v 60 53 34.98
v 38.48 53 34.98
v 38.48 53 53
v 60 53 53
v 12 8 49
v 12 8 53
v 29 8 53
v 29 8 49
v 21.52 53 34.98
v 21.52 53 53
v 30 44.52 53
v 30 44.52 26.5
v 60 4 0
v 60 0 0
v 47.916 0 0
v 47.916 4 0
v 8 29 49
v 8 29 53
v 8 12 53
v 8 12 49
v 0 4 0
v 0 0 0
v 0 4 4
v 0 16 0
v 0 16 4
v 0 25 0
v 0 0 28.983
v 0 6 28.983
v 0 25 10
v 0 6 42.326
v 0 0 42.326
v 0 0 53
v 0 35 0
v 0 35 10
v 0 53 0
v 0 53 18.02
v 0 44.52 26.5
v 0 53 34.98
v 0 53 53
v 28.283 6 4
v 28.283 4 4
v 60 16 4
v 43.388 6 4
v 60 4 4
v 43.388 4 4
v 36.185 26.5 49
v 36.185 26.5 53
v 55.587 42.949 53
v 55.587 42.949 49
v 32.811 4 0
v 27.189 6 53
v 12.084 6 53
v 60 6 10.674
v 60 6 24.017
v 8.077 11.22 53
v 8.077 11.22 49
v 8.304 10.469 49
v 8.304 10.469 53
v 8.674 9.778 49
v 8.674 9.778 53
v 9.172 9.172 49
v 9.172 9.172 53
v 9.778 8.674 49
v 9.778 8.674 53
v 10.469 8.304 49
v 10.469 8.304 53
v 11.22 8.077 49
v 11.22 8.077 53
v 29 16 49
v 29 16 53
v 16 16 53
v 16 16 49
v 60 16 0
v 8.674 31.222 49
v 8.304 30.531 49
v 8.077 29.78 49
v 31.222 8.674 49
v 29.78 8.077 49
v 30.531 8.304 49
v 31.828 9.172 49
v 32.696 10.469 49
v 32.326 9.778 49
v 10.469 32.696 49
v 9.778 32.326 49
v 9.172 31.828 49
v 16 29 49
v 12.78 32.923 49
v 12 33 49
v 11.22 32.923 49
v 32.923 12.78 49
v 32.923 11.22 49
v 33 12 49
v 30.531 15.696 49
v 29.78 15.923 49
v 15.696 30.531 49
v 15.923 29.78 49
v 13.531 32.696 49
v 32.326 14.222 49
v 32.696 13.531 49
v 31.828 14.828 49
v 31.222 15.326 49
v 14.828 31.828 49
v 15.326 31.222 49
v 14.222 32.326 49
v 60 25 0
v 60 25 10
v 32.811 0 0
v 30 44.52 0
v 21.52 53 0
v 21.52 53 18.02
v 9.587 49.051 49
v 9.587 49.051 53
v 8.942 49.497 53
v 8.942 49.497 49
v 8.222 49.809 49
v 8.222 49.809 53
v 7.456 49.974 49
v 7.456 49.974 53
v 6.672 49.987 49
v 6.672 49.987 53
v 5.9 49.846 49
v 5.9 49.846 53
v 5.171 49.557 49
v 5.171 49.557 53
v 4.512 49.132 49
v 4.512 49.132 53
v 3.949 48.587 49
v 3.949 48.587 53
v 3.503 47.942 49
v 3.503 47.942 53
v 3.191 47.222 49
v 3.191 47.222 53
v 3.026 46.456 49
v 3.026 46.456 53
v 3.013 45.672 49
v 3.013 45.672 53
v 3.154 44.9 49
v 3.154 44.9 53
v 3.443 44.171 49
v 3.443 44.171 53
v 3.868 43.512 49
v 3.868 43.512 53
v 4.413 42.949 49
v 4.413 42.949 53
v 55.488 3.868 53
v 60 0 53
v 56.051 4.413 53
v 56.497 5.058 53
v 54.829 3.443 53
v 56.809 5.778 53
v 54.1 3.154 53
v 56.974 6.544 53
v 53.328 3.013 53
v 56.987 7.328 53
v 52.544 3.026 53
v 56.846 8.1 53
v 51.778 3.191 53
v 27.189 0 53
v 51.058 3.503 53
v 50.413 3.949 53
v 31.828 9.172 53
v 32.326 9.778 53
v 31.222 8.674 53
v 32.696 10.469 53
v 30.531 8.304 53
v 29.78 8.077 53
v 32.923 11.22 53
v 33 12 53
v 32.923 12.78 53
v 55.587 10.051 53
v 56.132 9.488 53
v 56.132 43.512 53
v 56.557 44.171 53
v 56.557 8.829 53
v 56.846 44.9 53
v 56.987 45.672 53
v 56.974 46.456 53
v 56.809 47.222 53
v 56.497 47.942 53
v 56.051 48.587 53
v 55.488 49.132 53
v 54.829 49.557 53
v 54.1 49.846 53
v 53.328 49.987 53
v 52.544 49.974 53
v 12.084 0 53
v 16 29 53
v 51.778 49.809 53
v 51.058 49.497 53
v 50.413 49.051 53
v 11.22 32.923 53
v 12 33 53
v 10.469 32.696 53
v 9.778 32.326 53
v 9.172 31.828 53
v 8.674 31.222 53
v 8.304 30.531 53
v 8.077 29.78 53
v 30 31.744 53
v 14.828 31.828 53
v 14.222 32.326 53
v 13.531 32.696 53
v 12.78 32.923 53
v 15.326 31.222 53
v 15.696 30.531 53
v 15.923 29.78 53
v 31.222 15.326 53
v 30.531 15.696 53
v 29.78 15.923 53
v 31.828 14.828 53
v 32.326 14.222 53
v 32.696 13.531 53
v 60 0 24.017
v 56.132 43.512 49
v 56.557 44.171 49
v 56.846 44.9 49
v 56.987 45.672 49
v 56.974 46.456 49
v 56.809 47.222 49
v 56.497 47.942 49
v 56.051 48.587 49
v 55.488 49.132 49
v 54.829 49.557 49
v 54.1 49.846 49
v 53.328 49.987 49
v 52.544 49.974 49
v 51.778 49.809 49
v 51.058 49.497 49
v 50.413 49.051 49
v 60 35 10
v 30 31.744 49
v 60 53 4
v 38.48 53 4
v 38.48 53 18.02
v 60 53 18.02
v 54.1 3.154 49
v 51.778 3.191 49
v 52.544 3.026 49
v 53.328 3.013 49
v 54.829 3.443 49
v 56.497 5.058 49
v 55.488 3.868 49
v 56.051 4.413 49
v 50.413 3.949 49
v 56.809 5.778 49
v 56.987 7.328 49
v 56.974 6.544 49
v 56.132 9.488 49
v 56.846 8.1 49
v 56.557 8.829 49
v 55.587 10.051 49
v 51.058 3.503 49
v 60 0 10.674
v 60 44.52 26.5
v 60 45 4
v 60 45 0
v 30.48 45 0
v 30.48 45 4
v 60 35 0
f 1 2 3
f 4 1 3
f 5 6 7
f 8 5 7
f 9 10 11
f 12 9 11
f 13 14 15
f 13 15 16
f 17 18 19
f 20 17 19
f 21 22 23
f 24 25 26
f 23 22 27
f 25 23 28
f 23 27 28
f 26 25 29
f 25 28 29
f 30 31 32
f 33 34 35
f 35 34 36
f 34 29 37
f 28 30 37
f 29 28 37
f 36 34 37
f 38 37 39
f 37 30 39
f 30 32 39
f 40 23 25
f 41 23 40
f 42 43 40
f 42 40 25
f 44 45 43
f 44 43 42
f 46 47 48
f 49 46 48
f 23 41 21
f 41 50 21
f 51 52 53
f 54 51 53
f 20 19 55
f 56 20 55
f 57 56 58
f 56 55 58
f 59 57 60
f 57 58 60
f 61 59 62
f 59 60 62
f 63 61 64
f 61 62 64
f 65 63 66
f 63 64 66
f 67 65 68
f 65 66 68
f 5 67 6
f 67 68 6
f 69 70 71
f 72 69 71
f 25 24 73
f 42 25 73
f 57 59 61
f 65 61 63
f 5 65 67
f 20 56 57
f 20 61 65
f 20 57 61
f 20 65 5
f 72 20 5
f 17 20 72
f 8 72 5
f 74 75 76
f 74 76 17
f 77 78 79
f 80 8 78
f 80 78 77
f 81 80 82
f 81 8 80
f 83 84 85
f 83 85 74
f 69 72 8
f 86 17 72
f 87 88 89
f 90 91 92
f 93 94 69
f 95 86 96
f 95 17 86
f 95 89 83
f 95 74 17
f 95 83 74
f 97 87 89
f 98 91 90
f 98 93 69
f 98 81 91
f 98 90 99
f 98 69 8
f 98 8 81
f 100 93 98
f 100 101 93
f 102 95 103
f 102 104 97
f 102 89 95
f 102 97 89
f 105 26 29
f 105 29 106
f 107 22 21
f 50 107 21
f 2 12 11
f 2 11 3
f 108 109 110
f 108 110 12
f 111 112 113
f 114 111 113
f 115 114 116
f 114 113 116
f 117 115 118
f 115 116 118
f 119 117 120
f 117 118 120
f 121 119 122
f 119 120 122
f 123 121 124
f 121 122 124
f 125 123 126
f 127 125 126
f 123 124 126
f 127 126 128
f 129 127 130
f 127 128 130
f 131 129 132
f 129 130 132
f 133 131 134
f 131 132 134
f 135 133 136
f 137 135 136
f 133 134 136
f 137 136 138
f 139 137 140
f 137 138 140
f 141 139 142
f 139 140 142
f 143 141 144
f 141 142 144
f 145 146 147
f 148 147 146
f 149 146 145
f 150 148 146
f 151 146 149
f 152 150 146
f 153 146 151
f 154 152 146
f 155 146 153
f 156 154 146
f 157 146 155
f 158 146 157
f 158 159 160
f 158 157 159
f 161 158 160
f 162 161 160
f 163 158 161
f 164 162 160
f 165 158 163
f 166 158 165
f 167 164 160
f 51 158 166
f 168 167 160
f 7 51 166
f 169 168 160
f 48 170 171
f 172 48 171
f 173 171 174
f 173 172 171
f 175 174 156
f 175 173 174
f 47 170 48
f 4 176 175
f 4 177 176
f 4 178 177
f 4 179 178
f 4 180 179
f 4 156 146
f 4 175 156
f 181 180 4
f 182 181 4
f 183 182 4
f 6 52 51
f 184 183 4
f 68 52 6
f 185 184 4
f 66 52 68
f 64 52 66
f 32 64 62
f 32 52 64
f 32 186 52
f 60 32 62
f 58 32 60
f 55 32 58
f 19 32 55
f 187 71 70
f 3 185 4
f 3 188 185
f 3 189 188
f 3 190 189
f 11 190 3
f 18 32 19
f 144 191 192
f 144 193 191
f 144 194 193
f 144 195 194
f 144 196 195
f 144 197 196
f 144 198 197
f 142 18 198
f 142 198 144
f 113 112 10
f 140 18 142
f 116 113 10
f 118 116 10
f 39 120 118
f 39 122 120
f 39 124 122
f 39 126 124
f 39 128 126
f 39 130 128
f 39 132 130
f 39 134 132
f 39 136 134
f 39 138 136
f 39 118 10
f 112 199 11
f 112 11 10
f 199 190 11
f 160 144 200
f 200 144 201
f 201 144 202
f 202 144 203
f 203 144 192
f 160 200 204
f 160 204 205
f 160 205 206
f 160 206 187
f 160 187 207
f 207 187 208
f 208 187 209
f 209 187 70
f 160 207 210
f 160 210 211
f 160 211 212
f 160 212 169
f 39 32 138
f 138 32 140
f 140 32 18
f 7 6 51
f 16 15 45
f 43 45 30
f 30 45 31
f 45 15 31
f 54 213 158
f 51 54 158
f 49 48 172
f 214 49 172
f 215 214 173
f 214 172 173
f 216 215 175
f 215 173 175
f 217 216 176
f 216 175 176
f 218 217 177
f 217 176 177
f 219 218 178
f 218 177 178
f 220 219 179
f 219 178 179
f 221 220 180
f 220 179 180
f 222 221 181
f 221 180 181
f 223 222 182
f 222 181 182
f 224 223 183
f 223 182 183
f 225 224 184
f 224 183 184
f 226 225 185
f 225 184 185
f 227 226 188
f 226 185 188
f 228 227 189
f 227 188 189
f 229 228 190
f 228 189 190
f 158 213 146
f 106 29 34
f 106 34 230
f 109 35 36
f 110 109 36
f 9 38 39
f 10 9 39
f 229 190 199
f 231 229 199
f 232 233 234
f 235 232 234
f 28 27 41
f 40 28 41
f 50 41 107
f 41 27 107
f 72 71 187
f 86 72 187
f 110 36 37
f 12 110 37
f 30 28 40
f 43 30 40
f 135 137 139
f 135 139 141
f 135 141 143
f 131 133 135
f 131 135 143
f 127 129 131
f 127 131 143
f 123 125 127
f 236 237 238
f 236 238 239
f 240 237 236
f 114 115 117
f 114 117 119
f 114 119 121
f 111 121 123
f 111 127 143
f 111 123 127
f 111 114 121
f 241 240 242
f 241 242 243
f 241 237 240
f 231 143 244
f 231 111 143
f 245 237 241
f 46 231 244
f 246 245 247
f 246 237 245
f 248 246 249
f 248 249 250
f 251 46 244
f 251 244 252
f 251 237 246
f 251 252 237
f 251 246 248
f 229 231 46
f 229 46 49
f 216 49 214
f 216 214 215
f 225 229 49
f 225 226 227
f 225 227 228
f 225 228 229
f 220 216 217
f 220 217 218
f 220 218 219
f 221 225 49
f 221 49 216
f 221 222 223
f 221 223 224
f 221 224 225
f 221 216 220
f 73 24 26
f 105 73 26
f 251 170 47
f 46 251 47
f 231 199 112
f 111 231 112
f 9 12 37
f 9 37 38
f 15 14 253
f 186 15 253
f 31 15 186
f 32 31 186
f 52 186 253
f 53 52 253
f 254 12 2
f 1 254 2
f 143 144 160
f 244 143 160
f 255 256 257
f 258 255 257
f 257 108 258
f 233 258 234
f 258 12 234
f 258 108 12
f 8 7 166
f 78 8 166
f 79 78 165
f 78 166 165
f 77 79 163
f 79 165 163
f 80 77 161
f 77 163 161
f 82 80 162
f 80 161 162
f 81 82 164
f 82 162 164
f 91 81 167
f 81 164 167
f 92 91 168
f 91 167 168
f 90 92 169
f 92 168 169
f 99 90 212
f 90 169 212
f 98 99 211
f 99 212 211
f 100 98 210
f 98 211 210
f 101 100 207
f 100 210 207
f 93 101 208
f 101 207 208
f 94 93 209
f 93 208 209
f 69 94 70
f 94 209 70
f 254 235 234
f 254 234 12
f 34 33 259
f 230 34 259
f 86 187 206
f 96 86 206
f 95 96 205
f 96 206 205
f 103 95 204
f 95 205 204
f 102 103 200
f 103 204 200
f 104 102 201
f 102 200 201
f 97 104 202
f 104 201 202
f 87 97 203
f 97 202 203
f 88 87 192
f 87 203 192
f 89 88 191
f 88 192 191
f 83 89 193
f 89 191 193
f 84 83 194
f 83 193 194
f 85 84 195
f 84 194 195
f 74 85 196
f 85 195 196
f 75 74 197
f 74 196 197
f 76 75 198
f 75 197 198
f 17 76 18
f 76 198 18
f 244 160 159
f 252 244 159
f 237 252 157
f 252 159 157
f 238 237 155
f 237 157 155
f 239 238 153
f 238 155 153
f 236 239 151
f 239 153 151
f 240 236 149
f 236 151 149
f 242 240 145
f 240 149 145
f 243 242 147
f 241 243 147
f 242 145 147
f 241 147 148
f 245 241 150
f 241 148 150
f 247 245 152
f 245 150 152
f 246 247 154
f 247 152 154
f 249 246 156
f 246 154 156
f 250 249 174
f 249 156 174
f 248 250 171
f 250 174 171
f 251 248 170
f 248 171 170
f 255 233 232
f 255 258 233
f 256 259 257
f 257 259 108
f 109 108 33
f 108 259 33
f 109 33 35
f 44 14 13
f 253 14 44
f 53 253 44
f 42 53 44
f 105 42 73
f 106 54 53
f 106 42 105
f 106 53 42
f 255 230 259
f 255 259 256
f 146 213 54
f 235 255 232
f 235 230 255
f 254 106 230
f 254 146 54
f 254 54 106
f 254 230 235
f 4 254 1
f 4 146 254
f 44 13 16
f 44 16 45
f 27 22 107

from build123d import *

# Parameters (mm, degrees)
F0_W      = 53
F0_H      = 53
F1_DEPTH  = 60
F3_DEPTH  = 4
F4_DEPTH  = 53
F6_DEPTH  = 6
F8_DEPTH  = 60
F10_DEPTH = 4
F9_W      = 60
F9_H      = 10
F11_DEPTH = 10
F12_DEPTH = 25


with BuildPart() as f1:
    # F0 (on Right) → F1 (new body)
    with BuildSketch(Plane.YZ):
        with Locations((26.5, 26.5)):
            Rectangle(F0_W, F0_H)
    extrude(amount=F1_DEPTH)

    # F2 (on face) → F3 (cut)
    with BuildSketch(Plane.XY.offset(53)):
        with BuildLine():
            ThreePointArc((9.5867410065, 49.0510278539), (3.9489721461, 48.5867410065), (4.4132589935, 42.9489721461))
            Line((4.4132589935, 42.9489721461), (27.4132590282, 23.4489721167))
            ThreePointArc((27.4132590282, 23.4489721167), (26, 26.4999999772), (27.4132589935, 29.5510278539))
            Line((27.4132589935, 29.5510278539), (30, 31.7441343594))
            Line((30, 31.7441343594), (9.5867410065, 49.0510278539))
        make_face()
        with BuildLine():
            ThreePointArc((32.5867410065, 23.4489721461), (30.0000000228, 22.5), (27.4132590282, 23.4489721167))
            Line((27.4132590282, 23.4489721167), (50.4132589935, 3.9489721461))
            ThreePointArc((50.4132589935, 3.9489721461), (56.0510278539, 4.4132589935), (55.5867410065, 10.0510278539))
            Line((55.5867410065, 10.0510278539), (36.1853892444, 26.5))
            Line((36.1853892444, 26.5), (32.5867410065, 23.4489721461))
        make_face()
        with BuildLine():
            ThreePointArc((27.4132589935, 29.5510278539), (26, 26.4999999772), (27.4132590282, 23.4489721167))
            ThreePointArc((27.4132590282, 23.4489721167), (30.0000000228, 22.5), (32.5867410065, 23.4489721461))
            Line((32.5867410065, 23.4489721461), (36.1853892444, 26.5))
            Line((36.1853892444, 26.5), (55.5867410065, 42.9489721461))
            ThreePointArc((55.5867410065, 42.9489721461), (56.0510278539, 48.5867410065), (50.4132589935, 49.0510278539))
            Line((50.4132589935, 49.0510278539), (30, 31.7441343594))
            Line((30, 31.7441343594), (27.4132589935, 29.5510278539))
        make_face()
        with BuildLine():
            ThreePointArc((16, 29), (12, 33), (8, 29))
            Line((8, 29), (8, 12))
            ThreePointArc((8, 12), (9.1715728753, 9.1715728753), (12, 8))
            Line((12, 8), (29, 8))
            ThreePointArc((29, 8), (33, 12), (29, 16))
            Line((29, 16), (16, 16))
            Line((16, 16), (16, 29))
        make_face()
    extrude(amount=-F3_DEPTH, mode=Mode.SUBTRACT)

    # F2 (on face) → F4 (cut, through all)
    with BuildSketch(Plane.XY.offset(53)):
        Polygon((38.48, 53), (21.52, 53), (30, 44.52), align=None)
    extrude(amount=-F4_DEPTH, mode=Mode.SUBTRACT)

    # F5 (on face) → F6 (cut)
    with BuildSketch(Plane.XZ):
        Polygon((27.1889083829, 53), (12.0839592813, 53), (60, 10.6741640318), (60, 24.0168690716), align=None)
        Polygon((47.9160407187, 0), (0, 42.3258359682), (0, 28.9831309284), (32.8110916171, 0), align=None)
    extrude(amount=-F6_DEPTH, mode=Mode.SUBTRACT)

    # F7 (on face) → F8 (cut, through all)
    with BuildSketch(Plane(origin=(0, 0, 0), x_dir=(0, -1, 0), z_dir=(-1, 0, 0))):
        Polygon((-44.52, 26.5), (-53, 34.98), (-53, 18.02), align=None)
    extrude(amount=-F8_DEPTH, mode=Mode.SUBTRACT)

    # F9 (on face) → F10 (cut)
    with BuildSketch(Plane(origin=(0, 0, 0), x_dir=(1, 0, 0), z_dir=(0, 0, -1))):
        Polygon((0, -16), (60, -16), (60, -4), (47.9160407187, -4), (47.9160407187, -6), (32.8110916171, -6), (32.8110916171, -4), (0, -4), align=None)
        Polygon((38.48, -53), (60, -53), (60, -45), (30.48, -45), align=None)
    extrude(amount=-F10_DEPTH, mode=Mode.SUBTRACT)

    # F9 (on face) → F11 (cut)
    with BuildSketch(Plane(origin=(0, 0, 0), x_dir=(1, 0, 0), z_dir=(0, 0, -1))):
        with Locations((30, -30)):
            Rectangle(F9_W, F9_H)
    extrude(amount=-F11_DEPTH, mode=Mode.SUBTRACT)

    # F12 (cut): a face of the model
    f12_faces = [f1.faces().sort_by_distance(p)[0] for p in [
        (47.9160407187, 5, 2),
    ]]
    extrude(f12_faces, amount=-F12_DEPTH, mode=Mode.SUBTRACT)


solid = f1.part
